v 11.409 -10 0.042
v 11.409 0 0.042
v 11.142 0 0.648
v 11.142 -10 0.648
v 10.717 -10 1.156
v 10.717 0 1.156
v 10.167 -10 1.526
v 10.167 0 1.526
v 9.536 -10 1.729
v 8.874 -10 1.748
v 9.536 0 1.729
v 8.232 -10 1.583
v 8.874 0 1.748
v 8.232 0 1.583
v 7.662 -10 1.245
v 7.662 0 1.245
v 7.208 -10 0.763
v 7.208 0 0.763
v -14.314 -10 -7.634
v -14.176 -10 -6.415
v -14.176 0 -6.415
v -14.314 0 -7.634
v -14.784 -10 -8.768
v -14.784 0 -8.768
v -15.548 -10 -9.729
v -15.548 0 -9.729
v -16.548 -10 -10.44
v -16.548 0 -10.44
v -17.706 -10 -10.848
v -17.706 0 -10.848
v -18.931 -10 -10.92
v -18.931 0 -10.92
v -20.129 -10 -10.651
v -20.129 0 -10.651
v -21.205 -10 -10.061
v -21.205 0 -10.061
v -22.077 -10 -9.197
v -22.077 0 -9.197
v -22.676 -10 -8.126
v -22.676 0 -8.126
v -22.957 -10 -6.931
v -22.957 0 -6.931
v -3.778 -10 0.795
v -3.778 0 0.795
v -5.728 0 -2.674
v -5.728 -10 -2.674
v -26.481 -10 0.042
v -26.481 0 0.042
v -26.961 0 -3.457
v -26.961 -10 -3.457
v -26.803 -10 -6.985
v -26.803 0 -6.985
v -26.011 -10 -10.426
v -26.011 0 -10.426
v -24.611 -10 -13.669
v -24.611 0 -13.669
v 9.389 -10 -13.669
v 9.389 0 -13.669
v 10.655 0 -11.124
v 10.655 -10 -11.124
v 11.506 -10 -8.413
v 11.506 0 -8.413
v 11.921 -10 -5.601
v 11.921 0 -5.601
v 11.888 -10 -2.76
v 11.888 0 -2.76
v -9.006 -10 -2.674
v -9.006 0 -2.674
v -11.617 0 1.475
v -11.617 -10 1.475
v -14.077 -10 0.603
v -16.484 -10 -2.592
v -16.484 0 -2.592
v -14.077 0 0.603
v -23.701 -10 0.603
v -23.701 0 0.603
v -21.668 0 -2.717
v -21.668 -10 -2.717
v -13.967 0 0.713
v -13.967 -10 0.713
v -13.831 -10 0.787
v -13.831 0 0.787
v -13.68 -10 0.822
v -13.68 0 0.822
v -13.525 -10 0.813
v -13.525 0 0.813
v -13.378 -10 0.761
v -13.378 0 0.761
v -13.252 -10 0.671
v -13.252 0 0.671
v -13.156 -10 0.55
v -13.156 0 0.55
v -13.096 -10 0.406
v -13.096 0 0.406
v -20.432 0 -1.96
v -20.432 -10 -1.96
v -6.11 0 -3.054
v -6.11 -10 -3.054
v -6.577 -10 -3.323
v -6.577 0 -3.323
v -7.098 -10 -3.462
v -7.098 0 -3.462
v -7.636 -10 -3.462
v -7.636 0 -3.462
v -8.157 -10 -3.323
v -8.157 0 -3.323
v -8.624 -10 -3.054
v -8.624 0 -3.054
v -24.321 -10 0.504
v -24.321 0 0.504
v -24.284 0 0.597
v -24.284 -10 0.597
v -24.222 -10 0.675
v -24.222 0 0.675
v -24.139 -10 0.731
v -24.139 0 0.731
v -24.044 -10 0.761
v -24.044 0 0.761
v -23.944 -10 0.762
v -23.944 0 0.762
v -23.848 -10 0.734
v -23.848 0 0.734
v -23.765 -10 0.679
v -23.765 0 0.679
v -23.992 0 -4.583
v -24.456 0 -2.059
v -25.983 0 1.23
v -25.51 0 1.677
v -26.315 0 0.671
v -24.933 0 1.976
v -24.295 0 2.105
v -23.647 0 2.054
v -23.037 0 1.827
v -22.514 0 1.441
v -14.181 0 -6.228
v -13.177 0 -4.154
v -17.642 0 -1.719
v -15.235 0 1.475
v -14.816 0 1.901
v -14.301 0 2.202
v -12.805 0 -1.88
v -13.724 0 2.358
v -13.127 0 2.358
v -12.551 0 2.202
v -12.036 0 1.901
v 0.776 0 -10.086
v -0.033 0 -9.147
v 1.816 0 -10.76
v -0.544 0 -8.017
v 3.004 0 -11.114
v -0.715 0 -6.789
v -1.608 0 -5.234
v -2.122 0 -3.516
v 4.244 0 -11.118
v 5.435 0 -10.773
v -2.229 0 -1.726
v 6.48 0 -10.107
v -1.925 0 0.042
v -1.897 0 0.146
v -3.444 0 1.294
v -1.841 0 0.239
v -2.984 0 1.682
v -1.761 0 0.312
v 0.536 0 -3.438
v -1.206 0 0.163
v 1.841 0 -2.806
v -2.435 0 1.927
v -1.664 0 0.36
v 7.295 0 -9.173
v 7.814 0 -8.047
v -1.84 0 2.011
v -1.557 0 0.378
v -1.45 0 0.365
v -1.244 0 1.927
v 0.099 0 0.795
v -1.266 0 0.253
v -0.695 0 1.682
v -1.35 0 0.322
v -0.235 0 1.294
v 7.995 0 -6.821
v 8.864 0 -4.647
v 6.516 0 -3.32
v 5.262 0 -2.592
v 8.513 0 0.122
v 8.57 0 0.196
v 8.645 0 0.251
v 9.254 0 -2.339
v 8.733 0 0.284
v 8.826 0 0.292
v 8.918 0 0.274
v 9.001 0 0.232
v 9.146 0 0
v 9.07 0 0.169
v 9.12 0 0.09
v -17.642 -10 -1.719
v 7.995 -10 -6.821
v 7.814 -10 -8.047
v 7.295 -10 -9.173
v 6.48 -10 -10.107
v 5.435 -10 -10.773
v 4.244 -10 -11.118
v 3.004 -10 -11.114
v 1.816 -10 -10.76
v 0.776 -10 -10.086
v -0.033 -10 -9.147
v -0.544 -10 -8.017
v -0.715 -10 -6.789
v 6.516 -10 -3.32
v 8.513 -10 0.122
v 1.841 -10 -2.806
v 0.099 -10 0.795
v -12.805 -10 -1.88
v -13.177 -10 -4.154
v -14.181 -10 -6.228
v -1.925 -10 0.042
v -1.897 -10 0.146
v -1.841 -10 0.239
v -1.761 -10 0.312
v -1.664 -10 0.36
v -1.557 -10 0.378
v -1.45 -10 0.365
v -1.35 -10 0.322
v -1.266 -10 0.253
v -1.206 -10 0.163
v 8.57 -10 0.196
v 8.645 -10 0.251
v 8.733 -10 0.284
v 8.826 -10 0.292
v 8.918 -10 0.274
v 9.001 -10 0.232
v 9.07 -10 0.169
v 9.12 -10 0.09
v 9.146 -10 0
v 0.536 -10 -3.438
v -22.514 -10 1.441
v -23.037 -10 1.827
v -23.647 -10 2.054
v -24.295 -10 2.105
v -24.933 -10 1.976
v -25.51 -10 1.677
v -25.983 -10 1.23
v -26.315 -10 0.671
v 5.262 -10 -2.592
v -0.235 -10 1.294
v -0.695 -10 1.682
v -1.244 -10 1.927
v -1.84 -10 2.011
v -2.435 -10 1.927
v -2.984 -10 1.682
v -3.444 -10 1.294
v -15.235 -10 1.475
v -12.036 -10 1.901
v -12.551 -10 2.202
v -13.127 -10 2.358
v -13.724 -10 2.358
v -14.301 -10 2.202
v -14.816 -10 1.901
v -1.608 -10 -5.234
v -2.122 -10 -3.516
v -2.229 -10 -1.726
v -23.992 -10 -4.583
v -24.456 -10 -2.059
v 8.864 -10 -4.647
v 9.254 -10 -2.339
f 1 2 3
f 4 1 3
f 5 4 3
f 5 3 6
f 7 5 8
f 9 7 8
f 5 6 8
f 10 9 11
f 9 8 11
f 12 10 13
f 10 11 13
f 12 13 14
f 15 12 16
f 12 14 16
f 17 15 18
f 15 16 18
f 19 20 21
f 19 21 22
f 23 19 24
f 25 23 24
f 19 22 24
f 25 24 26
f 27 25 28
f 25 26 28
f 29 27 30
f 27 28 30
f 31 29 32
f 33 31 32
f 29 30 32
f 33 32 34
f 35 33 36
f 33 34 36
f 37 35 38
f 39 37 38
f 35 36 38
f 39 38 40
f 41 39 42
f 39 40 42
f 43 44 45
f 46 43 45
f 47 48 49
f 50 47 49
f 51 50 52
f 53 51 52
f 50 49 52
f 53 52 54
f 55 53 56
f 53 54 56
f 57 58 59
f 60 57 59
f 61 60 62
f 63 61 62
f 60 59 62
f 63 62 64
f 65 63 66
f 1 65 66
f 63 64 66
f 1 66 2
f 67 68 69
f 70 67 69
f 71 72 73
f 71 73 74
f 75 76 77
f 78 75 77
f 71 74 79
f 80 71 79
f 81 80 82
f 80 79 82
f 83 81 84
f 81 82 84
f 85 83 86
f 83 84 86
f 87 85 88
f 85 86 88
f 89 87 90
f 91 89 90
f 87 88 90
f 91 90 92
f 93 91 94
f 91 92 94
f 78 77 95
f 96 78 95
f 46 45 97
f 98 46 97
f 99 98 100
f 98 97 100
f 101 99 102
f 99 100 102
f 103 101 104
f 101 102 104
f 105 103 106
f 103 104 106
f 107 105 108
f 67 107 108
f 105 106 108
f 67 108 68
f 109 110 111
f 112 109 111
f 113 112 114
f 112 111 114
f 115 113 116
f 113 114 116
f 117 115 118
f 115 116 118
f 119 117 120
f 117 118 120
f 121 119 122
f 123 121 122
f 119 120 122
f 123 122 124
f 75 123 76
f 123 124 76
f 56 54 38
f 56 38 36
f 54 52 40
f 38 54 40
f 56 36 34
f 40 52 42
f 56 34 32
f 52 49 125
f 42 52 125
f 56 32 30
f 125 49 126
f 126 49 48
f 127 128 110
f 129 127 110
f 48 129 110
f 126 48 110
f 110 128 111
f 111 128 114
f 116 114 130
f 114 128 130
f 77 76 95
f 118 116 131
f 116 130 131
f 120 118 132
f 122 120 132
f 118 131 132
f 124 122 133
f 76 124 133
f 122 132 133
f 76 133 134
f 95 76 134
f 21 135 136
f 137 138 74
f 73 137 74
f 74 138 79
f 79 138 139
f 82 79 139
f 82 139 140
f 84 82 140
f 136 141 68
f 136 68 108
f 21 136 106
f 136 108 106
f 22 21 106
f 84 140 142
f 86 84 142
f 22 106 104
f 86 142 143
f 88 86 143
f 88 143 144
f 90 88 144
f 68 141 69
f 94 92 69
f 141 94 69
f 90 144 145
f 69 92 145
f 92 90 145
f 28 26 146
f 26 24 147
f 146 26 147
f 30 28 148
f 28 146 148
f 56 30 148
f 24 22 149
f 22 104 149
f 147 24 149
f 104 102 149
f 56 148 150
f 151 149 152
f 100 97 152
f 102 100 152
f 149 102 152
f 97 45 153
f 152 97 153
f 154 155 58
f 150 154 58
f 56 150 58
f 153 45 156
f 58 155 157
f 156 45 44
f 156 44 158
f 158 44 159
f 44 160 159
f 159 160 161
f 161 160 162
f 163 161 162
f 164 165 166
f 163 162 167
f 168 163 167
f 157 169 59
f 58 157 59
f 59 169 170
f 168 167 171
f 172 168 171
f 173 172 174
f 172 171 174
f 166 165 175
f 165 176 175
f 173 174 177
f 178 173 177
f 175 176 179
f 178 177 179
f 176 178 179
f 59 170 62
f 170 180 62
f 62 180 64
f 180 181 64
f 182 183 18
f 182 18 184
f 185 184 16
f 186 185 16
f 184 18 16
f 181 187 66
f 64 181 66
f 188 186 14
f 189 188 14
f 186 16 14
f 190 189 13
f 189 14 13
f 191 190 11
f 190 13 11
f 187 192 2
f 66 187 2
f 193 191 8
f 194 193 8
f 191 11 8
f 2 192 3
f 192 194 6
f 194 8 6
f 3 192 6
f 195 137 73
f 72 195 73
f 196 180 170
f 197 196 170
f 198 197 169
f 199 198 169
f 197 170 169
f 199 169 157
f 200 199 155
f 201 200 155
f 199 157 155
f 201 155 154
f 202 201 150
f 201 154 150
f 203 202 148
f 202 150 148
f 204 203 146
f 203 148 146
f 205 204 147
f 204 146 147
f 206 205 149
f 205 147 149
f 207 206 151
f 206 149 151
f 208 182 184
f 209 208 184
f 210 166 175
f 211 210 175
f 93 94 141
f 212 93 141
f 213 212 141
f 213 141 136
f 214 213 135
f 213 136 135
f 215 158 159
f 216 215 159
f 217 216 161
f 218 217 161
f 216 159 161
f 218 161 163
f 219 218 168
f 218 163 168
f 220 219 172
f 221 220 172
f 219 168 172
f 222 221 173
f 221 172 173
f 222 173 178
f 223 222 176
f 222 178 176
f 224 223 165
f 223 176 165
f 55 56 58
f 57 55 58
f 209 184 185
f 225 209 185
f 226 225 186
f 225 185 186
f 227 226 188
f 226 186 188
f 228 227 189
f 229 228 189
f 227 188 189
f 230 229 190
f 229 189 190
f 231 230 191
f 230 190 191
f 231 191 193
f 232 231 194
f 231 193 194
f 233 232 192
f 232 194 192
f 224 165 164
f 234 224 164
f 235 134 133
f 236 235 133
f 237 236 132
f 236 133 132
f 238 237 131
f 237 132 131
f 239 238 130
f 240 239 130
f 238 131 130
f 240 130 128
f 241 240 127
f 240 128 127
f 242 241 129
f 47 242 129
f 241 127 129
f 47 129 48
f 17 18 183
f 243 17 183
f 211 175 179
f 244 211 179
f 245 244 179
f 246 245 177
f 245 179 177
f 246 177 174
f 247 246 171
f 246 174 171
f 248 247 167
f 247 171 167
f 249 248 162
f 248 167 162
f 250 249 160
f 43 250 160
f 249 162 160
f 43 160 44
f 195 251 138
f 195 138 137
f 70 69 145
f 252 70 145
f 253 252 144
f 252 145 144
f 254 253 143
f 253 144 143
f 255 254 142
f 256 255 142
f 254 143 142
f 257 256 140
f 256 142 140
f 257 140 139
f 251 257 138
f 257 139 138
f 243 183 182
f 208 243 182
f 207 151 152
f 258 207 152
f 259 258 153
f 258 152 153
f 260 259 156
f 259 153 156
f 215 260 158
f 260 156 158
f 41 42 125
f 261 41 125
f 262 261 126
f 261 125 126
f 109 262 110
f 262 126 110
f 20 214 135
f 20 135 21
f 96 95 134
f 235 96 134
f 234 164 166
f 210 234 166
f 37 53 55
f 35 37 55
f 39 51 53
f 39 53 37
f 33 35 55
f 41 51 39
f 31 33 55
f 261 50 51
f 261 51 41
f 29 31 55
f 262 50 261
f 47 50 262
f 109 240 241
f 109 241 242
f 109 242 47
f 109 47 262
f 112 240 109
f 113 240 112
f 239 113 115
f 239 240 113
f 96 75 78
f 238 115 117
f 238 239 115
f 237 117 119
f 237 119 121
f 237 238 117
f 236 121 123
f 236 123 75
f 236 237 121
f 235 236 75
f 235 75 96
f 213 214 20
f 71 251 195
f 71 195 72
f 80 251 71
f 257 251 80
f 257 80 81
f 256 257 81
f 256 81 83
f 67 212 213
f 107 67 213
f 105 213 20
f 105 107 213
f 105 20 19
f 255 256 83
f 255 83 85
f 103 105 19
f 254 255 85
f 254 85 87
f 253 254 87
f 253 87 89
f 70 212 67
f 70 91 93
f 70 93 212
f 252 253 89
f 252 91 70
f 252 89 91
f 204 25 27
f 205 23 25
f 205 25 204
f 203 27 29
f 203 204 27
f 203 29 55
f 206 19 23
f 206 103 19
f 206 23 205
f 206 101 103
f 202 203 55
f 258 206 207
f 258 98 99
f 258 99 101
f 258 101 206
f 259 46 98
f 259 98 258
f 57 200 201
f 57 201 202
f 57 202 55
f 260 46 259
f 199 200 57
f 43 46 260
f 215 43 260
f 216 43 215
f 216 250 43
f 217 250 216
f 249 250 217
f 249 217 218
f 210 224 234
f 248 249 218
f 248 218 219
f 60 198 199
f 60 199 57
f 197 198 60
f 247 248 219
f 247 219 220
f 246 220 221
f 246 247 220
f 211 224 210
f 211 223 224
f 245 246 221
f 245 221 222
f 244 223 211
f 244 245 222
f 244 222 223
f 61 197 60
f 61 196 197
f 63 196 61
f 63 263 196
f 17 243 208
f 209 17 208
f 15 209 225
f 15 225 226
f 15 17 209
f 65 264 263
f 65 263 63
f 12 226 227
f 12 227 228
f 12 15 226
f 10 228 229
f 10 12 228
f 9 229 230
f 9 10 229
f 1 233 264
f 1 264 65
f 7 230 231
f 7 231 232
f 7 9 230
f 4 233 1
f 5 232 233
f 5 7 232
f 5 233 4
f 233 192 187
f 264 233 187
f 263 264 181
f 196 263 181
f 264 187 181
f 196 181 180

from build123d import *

# Parameters (mm, degrees)
F1_DEPTH = 10


with BuildPart() as f1:
    # F0 (on Front) → F1 (new body)
    with BuildSketch(Plane.XZ):
        with BuildLine():
            ThreePointArc((-26.480538, 0.041752), (-26.80275, -6.984853), (-24.610945, -13.66864))
            Line((-24.610945, -13.66864), (9.389055, -13.66864))
            ThreePointArc((9.389055, -13.66864), (11.76884, -7.015264), (11.409232, 0.041752))
            ThreePointArc((11.409232, 0.041752), (9.53605, 1.729011), (7.207622, 0.762533))
            Line((7.207622, 0.762533), (5.26171, -2.592488))
            Line((5.26171, -2.592488), (6.516005, -3.31998))
            Line((6.516005, -3.31998), (8.512528, 0.122302))
            ThreePointArc((8.512528, 0.122302), (8.872618, 0.286233), (9.145764, 0))
            ThreePointArc((9.145764, 0), (9.12048, -3.50336), (7.994913, -6.821081))
            ThreePointArc((7.994913, -6.821081), (3.623874, -11.160444), (-0.715488, -6.789405))
            ThreePointArc((-0.715488, -6.789405), (-2.12155, -3.515707), (-1.92509, 0.041752))
            ThreePointArc((-1.92509, 0.041752), (-1.611125, 0.372473), (-1.205894, 0.163336))
            Line((-1.205894, 0.163336), (0.535578, -3.437674))
            Line((0.535578, -3.437674), (1.840945, -2.80639))
            Line((1.840945, -2.80639), (0.099355, 0.794863))
            ThreePointArc((0.099355, 0.794863), (-1.83955, 2.01093), (-3.778454, 0.794863))
            Line((-3.778454, 0.794863), (-5.72786, -2.673798))
            ThreePointArc((-5.72786, -2.673798), (-7.366983, -3.479416), (-9.006107, -2.673798))
            Line((-9.006107, -2.673798), (-11.616714, 1.475432))
            ThreePointArc((-11.616714, 1.475432), (-13.425926, 2.377495), (-15.235137, 1.475432))
            Line((-15.235137, 1.475432), (-17.64233, -1.719161))
            Line((-17.64233, -1.719161), (-16.48429, -2.591769))
            Line((-16.48429, -2.591769), (-14.077097, 0.602824))
            ThreePointArc((-14.077097, 0.602824), (-13.524899, 0.812886), (-13.096491, 0.406049))
            ThreePointArc((-13.096491, 0.406049), (-12.908327, -3.030287), (-14.181236, -6.22771))
            Line((-14.181236, -6.22771), (-14.176145, -6.414763))
            ThreePointArc((-14.176145, -6.414763), (-18.316139, -10.926878), (-22.956589, -6.931259))
            ThreePointArc((-22.956589, -6.931259), (-24.297873, -3.334327), (-24.321447, 0.504476))
            ThreePointArc((-24.321447, 0.504476), (-24.044014, 0.761092), (-23.700835, 0.602824))
            Line((-23.700835, 0.602824), (-21.668322, -2.716693))
            Line((-21.668322, -2.716693), (-20.431714, -1.959527))
            Line((-20.431714, -1.959527), (-22.51379, 1.440936))
            ThreePointArc((-22.51379, 1.440936), (-24.932699, 1.976107), (-26.480538, 0.041752))
        make_face()
    extrude(amount=F1_DEPTH)


solid = f1.part
